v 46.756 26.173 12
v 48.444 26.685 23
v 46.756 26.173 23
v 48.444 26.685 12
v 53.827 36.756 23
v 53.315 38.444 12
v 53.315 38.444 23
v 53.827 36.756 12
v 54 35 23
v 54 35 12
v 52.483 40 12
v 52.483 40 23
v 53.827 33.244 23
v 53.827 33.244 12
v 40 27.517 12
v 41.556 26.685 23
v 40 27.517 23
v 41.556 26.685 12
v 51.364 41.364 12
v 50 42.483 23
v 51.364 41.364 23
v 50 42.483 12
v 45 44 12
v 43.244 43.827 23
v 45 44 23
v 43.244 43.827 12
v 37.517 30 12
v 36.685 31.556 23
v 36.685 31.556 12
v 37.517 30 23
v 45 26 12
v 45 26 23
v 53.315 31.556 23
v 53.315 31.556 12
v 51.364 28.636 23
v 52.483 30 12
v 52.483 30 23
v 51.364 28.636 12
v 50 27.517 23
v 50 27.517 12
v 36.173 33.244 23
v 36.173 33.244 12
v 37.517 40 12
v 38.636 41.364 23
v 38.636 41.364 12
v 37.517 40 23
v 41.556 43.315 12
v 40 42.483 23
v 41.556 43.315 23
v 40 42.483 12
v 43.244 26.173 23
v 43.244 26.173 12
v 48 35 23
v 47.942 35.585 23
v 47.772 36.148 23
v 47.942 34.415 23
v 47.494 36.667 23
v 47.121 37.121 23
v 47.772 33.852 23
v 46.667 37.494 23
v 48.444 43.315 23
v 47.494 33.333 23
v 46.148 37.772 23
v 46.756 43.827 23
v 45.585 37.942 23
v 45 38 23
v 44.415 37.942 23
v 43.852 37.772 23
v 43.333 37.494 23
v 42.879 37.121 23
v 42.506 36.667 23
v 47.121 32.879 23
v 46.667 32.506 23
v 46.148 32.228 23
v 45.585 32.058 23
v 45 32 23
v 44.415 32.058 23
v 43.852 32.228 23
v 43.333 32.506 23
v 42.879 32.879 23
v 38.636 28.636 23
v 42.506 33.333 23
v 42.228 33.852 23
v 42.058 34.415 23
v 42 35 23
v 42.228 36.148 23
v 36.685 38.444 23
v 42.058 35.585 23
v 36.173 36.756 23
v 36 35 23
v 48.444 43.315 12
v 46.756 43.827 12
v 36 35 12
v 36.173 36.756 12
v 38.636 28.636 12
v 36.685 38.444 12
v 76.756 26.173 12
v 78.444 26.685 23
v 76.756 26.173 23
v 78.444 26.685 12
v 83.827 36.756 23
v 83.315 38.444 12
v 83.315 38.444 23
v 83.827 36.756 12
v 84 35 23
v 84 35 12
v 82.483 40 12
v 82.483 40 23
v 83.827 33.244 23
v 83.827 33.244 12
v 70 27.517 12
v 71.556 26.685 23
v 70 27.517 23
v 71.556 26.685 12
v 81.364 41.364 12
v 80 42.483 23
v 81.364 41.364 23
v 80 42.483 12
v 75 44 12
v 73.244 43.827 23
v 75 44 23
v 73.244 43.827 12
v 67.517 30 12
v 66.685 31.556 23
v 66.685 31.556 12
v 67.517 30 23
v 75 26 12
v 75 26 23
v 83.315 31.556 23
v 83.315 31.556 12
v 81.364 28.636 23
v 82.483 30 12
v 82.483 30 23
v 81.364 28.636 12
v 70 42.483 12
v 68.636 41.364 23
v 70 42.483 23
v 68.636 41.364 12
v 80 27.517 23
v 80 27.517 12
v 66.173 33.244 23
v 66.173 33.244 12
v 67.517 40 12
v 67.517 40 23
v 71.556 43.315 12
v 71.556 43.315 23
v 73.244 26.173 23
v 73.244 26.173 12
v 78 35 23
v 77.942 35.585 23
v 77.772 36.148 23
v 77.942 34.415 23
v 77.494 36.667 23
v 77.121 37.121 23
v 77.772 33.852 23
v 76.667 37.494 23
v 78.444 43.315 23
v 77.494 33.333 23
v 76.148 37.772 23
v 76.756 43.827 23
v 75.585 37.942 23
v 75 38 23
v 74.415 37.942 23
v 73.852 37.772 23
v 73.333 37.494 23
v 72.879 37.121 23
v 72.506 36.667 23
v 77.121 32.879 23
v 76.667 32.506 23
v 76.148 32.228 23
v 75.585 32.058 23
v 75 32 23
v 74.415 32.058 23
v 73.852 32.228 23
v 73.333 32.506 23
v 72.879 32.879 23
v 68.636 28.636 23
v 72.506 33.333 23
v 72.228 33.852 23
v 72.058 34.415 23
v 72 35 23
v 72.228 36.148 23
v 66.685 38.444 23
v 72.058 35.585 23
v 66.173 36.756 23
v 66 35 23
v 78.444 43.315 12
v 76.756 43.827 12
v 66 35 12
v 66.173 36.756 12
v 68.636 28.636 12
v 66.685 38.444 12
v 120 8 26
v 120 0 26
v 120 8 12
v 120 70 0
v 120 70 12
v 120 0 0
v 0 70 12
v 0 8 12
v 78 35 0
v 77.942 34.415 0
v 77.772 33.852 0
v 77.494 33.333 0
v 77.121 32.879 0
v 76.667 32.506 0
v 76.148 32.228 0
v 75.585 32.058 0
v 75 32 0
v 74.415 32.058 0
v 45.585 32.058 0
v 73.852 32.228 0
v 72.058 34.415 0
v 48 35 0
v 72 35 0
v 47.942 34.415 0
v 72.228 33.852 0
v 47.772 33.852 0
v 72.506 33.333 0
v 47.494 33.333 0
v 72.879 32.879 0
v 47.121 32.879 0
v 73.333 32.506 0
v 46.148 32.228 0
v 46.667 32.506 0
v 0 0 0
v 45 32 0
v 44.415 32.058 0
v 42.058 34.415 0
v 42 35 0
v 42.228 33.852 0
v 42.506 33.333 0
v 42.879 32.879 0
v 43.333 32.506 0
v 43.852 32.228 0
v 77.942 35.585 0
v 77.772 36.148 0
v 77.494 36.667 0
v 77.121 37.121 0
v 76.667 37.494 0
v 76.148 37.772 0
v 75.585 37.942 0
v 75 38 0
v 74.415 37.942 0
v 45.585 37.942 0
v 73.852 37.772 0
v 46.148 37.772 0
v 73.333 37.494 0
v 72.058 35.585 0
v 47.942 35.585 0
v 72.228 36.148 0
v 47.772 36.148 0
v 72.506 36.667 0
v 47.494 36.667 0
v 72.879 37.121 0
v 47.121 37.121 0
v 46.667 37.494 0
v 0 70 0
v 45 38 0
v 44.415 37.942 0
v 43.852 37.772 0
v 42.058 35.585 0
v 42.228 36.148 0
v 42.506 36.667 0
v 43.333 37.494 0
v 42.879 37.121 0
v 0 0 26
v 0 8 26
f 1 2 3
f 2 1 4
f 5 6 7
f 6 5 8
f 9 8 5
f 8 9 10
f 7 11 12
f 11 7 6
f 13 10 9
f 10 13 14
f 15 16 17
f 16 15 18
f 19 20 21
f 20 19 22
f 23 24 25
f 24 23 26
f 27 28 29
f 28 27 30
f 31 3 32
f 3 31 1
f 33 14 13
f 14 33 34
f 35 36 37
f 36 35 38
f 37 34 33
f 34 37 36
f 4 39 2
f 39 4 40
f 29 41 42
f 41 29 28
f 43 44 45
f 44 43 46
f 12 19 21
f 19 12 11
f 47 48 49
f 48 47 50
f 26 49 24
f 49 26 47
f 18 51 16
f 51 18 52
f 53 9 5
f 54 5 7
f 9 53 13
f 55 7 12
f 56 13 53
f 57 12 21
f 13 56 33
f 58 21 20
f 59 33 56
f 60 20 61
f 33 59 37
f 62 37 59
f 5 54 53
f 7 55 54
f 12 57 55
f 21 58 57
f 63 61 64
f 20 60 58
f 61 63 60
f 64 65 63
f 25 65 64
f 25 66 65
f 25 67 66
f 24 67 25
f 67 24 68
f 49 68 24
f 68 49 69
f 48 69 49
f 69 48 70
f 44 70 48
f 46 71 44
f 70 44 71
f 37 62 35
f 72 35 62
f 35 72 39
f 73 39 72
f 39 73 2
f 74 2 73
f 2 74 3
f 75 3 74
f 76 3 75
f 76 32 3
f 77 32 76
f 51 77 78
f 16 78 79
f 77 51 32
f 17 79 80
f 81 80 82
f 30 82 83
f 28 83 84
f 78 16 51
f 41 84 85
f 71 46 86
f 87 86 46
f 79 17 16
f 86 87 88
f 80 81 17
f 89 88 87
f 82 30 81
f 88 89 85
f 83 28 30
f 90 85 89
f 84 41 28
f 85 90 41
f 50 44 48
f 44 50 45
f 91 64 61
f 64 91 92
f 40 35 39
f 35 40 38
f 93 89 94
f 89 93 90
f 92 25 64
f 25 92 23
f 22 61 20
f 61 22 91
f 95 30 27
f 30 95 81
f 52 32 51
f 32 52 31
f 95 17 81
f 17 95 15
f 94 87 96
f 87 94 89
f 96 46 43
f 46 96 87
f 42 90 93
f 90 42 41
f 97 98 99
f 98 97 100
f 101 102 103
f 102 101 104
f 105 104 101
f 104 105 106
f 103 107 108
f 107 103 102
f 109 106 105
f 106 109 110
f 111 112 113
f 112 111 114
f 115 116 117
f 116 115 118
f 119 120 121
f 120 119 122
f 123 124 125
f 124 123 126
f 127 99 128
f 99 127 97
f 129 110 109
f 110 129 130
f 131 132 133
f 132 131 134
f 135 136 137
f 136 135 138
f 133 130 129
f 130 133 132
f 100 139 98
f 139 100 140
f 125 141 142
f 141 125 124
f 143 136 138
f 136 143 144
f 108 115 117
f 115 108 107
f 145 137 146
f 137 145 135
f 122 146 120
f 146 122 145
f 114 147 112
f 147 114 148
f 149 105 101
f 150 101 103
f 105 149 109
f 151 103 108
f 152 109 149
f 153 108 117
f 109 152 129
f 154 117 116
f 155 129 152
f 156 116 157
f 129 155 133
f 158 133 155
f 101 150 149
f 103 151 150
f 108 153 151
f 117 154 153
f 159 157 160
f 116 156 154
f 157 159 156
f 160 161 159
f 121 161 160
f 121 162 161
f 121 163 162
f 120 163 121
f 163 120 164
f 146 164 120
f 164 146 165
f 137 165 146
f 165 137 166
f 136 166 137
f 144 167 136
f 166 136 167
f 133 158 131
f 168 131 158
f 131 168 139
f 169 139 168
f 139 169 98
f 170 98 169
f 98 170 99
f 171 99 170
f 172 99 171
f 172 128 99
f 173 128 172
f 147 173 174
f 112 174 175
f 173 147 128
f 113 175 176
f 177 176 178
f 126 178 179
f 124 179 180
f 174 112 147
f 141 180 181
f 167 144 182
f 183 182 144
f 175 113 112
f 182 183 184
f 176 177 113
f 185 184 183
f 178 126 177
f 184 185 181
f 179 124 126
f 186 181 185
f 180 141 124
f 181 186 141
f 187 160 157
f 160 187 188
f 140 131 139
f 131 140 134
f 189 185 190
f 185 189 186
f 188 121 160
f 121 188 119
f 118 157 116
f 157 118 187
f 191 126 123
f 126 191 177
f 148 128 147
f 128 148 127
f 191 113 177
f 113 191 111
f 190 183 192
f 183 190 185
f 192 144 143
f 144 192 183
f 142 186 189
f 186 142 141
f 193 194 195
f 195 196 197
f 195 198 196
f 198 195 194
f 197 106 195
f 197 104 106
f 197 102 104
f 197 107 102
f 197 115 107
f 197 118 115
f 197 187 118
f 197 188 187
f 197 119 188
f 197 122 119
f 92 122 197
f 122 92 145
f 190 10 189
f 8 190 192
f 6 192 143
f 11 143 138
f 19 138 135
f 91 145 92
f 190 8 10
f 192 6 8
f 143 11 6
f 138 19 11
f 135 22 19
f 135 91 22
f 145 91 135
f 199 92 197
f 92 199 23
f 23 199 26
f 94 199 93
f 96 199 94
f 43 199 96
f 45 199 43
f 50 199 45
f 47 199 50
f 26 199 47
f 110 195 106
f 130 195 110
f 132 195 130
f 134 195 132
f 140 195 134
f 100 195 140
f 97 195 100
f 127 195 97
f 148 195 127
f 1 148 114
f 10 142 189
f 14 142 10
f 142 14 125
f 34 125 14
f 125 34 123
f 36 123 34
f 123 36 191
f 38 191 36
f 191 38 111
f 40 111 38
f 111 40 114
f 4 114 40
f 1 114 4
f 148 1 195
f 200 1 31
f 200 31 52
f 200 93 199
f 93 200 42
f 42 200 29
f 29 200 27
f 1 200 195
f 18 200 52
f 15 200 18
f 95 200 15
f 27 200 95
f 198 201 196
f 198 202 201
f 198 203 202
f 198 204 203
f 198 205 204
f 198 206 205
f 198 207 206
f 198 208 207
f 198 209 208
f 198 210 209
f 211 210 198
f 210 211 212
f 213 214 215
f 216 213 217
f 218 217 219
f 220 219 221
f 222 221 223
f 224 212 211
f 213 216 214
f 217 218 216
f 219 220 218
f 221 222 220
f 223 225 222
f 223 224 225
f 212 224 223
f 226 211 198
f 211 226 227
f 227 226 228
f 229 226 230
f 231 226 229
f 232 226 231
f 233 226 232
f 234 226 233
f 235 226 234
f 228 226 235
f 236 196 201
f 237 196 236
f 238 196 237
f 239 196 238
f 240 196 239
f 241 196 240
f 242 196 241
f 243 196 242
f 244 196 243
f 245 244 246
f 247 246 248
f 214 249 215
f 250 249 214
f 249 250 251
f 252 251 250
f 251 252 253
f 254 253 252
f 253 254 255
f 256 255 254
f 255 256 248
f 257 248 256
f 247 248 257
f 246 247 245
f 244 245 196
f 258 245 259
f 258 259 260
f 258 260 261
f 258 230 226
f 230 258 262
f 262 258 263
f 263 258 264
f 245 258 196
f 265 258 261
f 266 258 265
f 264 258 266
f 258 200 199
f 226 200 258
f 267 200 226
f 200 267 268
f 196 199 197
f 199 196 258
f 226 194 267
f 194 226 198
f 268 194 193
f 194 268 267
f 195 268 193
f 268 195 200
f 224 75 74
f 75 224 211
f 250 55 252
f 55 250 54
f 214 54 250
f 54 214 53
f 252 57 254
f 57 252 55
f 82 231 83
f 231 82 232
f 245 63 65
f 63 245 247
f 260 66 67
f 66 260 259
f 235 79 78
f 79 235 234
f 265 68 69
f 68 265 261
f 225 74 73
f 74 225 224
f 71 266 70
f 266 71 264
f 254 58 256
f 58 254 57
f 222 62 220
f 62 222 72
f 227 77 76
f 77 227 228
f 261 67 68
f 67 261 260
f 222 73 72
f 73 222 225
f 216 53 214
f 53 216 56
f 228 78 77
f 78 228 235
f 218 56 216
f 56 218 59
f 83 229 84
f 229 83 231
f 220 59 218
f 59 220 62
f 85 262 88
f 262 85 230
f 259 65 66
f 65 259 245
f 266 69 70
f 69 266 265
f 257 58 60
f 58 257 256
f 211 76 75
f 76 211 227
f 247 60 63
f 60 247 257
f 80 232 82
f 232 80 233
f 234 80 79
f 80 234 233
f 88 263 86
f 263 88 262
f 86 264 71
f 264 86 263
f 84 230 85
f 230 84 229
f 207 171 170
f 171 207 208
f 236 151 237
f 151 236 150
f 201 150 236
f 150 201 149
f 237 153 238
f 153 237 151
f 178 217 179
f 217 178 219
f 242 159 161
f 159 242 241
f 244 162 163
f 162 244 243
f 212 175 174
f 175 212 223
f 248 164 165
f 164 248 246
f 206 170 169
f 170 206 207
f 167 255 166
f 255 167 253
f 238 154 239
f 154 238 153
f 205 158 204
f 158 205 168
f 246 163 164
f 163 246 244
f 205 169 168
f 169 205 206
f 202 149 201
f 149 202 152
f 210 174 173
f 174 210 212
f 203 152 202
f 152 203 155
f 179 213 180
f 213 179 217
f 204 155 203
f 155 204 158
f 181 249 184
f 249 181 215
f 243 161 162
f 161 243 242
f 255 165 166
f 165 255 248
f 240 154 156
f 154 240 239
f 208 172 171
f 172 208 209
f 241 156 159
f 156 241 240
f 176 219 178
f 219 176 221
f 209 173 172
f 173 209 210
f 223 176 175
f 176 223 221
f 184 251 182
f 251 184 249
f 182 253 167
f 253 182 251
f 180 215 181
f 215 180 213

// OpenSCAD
$fn = 32;

// ----------------------------------------------------------------------
// Drill jig: fence jig
// ----------------------------------------------------------------------

// --- parameters (mm) ---
plate_l = 120;            // plate length, X
plate_w = 70;             // plate width, Y
plate_t = 12;             // plate thickness
boss_d = 18;              // guide boss diameter
boss_h = 12;              // boss height above the plate
guide_d = 6;              // guide hole diameter
boss_pitch = 30;          // boss pitch
fence_h = 15;             // fence height above the plate
fence_t = 8;              // fence thickness

n_boss = 2;  // guide bosses
boss_x0 = (plate_l - (n_boss - 1) * boss_pitch) / 2;  // first boss X
boss_top = plate_t - 1 + boss_h;  // boss crown height
fence_top = plate_t - 1 + fence_h;  // fence crown height
total_h = max([fence_top, boss_top]);  // overall height

difference() {
  union() {
  cube([plate_l, plate_w, plate_t]);
  for (i = [0 : n_boss - 1])
    translate([boss_x0 + i * boss_pitch, plate_w / 2, plate_t - 1])
      cylinder(h = boss_h, d = boss_d);
  translate([0, 0, plate_t - 1]) cube([plate_l, fence_t, fence_h]);
  }
  for (i = [0 : n_boss - 1])
    translate([boss_x0 + i * boss_pitch, plate_w / 2, -1])
      cylinder(h = plate_t + boss_h, d = guide_d);
}
